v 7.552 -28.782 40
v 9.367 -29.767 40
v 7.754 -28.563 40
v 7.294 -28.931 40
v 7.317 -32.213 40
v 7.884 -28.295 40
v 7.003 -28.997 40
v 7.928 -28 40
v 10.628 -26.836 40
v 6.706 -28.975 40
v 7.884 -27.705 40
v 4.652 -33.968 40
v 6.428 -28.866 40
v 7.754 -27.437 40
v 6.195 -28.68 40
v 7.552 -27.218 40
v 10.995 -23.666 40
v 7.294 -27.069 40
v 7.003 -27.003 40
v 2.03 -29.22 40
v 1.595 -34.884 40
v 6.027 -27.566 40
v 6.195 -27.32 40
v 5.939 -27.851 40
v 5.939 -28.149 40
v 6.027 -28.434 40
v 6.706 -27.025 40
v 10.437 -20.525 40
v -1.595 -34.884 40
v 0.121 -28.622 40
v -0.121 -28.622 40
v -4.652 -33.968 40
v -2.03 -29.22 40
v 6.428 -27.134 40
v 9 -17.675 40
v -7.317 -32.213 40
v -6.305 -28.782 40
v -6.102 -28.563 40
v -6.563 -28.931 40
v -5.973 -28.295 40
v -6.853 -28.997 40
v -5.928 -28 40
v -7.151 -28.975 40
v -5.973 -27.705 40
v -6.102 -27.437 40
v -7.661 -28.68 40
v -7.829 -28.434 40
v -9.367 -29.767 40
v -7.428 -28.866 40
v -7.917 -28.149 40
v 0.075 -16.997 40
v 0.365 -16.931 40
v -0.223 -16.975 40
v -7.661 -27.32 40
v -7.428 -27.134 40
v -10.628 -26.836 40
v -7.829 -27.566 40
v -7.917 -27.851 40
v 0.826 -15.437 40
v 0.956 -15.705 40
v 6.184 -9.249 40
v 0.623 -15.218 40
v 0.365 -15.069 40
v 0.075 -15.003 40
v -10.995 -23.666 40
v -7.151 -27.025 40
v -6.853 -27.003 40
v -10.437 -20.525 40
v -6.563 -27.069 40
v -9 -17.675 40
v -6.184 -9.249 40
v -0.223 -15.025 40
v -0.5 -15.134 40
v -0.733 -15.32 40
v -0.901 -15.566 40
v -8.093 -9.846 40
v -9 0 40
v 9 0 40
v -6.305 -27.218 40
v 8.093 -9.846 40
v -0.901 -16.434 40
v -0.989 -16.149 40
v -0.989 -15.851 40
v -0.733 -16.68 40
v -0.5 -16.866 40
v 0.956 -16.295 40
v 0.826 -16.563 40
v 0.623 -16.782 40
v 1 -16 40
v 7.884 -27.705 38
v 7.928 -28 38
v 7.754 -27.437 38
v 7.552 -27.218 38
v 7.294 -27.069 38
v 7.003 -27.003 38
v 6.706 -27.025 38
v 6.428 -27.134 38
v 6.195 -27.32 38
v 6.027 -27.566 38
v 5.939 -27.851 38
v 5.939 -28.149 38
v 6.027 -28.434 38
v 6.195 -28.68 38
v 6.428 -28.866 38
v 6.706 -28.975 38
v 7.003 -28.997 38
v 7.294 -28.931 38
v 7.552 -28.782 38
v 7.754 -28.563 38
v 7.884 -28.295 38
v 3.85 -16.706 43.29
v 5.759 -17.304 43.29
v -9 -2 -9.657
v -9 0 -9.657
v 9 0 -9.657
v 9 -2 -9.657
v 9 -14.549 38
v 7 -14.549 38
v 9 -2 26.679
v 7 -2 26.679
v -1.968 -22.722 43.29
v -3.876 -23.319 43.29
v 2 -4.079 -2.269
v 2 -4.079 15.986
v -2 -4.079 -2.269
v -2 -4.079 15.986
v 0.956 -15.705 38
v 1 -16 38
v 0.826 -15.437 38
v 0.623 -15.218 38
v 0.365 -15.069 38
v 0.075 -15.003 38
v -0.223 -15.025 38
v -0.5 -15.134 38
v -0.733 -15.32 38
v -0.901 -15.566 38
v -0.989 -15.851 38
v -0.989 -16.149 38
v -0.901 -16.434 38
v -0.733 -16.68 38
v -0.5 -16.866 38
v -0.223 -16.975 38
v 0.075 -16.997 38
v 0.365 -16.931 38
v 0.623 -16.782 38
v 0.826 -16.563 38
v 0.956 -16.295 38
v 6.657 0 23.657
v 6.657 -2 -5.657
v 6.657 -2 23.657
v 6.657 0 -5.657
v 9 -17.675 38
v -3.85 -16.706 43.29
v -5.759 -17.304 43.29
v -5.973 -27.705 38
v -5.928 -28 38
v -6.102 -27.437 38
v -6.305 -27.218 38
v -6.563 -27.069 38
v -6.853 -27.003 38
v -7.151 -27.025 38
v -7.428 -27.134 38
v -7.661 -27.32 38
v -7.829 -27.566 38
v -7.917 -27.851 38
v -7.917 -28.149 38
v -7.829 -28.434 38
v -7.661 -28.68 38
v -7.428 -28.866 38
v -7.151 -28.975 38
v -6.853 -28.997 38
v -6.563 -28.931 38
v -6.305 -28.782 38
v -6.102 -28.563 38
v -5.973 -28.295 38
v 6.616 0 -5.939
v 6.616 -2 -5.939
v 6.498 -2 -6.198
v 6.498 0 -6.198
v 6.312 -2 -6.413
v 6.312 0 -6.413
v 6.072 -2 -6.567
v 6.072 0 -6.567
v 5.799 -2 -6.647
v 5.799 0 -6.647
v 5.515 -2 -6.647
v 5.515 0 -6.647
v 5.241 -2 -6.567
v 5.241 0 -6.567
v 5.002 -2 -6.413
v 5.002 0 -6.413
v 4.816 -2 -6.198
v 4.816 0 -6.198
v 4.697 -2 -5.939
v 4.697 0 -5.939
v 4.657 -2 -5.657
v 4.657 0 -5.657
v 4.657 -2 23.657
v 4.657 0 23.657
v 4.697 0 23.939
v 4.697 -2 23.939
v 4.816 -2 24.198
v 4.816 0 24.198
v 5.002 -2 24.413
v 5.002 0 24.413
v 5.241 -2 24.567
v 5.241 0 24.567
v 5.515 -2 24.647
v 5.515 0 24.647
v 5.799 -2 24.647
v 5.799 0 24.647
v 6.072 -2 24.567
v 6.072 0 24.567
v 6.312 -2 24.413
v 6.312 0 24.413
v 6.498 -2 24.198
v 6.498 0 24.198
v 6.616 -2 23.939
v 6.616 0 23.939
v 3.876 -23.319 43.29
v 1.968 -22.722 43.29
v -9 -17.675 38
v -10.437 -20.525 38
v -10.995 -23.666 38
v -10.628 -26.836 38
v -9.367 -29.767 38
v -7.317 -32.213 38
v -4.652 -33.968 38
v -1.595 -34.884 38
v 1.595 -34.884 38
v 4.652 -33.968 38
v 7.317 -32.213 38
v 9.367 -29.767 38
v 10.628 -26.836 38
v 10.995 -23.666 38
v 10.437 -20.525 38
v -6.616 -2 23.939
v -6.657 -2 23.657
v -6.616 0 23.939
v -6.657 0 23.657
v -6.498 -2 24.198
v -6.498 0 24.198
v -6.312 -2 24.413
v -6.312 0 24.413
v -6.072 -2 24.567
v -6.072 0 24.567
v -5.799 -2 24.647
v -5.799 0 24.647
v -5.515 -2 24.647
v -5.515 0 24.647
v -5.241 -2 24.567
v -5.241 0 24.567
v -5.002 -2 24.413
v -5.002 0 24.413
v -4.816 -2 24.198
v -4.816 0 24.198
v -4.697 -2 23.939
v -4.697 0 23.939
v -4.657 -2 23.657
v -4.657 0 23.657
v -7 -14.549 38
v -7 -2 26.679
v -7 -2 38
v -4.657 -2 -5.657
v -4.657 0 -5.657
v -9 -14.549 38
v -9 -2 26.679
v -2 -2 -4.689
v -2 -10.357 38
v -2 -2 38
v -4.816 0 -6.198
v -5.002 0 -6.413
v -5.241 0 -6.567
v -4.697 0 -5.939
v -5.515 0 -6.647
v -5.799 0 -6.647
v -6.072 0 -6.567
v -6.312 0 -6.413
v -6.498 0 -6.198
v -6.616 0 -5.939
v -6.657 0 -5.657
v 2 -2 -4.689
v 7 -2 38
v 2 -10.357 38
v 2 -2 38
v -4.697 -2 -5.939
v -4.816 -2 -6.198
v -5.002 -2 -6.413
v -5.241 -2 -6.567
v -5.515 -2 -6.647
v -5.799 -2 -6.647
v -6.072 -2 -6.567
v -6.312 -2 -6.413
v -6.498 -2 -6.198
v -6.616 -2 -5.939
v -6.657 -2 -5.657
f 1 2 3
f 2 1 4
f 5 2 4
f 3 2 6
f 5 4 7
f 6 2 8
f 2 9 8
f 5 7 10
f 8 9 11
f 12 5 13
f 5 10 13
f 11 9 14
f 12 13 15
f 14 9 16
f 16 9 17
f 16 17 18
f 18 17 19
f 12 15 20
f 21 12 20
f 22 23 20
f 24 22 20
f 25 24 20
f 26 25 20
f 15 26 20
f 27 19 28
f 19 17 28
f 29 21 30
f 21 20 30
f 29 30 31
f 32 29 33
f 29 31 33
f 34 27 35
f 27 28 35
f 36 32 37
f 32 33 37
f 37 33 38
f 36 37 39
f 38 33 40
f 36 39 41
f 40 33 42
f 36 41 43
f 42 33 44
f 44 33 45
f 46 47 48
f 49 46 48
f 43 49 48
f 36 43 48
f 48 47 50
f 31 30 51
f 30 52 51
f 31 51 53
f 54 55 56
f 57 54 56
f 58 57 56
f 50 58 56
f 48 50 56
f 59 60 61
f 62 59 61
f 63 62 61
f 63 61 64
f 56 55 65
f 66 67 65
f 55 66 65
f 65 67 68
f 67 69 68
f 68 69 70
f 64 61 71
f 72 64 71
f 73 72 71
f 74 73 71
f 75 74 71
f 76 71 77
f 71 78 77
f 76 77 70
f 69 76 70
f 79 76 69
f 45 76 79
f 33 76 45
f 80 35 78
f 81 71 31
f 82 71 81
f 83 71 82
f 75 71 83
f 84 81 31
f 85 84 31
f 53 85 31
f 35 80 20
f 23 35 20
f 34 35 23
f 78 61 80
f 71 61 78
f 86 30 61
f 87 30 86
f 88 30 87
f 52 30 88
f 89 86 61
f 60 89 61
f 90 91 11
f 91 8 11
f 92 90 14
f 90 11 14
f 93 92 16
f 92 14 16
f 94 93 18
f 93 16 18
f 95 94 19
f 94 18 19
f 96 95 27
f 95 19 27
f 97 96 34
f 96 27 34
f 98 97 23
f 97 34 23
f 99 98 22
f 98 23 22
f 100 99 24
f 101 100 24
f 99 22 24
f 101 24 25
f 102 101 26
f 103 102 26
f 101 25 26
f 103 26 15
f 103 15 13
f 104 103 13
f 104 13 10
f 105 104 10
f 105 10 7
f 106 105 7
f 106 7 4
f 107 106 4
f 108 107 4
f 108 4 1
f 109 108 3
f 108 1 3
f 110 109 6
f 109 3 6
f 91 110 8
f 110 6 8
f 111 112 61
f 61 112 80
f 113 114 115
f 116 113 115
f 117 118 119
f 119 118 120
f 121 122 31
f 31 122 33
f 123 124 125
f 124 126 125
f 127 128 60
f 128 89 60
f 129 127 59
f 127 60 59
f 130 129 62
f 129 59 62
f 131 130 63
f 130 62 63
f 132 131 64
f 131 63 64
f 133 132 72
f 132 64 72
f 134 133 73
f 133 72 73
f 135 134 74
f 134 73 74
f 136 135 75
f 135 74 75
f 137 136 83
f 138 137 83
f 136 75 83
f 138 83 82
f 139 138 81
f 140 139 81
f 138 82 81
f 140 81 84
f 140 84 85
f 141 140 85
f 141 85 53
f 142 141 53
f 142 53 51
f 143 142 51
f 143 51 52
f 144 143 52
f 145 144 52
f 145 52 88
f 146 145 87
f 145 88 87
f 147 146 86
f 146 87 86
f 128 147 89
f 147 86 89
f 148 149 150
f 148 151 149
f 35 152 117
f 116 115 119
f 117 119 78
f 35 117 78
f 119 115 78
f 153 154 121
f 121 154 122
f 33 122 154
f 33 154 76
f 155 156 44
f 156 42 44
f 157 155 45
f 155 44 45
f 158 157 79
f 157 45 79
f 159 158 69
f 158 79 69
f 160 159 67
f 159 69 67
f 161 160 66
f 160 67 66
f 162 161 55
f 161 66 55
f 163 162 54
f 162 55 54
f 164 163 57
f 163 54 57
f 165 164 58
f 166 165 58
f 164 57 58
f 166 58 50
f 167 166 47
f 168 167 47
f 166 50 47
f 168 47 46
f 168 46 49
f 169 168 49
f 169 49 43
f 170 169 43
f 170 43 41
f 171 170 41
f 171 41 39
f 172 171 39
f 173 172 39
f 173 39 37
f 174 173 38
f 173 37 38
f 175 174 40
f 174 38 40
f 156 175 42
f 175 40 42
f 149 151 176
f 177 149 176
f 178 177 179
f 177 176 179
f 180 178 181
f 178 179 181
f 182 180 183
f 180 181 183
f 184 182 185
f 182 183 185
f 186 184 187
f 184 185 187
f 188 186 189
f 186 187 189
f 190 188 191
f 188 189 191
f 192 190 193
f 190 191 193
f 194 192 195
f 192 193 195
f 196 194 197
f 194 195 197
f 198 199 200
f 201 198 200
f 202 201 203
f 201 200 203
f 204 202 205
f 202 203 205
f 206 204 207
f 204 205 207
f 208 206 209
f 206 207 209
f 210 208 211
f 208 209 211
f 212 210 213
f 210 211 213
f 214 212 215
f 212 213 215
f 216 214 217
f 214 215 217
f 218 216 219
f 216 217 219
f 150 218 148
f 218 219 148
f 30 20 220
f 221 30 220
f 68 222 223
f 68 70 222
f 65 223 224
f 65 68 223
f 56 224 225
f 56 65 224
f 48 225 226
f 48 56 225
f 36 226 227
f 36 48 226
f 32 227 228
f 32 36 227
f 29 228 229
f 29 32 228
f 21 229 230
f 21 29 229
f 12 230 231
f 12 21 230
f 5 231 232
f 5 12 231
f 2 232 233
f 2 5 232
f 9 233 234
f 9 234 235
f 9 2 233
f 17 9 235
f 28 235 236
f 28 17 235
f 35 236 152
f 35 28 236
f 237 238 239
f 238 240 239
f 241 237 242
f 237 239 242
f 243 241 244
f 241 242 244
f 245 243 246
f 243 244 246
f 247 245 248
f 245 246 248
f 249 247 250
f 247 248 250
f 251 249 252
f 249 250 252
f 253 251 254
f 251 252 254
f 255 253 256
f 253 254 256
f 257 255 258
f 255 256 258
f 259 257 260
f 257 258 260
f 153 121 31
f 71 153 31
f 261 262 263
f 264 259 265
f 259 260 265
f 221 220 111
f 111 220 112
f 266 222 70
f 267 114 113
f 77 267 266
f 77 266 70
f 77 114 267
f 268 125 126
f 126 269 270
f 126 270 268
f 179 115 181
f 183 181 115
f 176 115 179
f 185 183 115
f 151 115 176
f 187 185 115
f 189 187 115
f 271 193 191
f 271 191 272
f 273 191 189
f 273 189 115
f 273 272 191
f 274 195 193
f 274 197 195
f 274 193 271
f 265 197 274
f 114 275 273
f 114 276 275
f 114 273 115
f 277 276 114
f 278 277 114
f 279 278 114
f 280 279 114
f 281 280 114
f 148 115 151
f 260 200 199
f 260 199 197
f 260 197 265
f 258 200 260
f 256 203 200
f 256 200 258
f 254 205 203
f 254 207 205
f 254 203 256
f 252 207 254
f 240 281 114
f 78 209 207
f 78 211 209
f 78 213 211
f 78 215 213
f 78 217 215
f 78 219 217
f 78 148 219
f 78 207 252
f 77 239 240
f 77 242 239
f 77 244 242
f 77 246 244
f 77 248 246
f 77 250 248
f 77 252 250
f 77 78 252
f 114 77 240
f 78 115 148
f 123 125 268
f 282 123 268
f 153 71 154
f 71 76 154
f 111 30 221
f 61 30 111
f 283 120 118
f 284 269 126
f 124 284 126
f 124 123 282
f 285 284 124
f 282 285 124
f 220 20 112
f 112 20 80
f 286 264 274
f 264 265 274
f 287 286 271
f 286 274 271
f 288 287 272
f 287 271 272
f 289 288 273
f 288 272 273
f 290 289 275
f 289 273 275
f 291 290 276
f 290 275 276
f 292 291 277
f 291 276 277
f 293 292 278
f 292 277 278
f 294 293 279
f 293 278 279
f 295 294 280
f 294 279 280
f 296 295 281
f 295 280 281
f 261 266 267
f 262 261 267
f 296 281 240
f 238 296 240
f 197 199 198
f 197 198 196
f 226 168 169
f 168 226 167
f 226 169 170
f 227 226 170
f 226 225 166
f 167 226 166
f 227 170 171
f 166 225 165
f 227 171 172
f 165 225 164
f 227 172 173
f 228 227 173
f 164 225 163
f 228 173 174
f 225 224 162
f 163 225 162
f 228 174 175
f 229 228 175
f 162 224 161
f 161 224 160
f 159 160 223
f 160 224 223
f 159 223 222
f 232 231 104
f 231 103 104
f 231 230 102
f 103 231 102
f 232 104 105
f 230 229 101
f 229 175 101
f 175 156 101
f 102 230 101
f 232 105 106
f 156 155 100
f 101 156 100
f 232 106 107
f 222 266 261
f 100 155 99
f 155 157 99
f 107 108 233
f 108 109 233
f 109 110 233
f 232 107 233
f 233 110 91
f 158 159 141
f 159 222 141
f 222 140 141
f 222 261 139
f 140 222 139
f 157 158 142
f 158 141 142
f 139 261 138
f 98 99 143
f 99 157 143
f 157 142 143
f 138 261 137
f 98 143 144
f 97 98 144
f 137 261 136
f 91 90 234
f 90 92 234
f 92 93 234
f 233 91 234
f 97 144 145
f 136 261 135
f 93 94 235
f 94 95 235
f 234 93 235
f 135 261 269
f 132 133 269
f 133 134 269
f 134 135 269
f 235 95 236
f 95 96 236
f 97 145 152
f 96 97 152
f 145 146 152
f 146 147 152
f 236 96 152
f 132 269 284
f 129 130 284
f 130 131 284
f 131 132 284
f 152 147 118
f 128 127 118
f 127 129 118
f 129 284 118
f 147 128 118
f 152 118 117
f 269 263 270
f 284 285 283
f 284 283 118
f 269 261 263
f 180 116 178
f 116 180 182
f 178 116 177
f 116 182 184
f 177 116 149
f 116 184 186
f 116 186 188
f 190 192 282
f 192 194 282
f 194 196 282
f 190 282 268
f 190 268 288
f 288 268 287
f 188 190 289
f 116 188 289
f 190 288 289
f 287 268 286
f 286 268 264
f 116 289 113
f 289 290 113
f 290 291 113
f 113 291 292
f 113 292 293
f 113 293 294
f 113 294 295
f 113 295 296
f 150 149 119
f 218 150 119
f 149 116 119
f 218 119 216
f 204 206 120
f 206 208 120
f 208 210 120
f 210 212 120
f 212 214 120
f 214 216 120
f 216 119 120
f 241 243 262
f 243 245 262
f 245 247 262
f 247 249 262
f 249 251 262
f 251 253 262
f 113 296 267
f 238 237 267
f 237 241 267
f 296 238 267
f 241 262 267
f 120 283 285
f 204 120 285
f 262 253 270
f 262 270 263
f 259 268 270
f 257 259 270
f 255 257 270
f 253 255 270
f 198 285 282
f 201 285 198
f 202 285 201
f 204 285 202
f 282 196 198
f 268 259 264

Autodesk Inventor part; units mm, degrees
ref_plane "XZ Plane" through (0, 0, 0) normal (0, 1, 0) x (-1, 0, 0)
ref_plane "XY Plane" through (0, 0, 0) normal (0, 0, 1) x (1, 0, 0)
sketch "Sketch1" plane through (0, 0, 0) normal (0, 1, 0) x (-1, 0, 0)
  line L0 (-9, 40) -> (9, 40)
  line L1 (9, 40) -> (9, -9.6569)
  line L2 (9, -9.6569) -> (-9, -9.6569)
  line L3 (-9, -9.6569) -> (-9, 40)
  line L4 (-9, 40) -> (9, -9.6569) construction
  line L5 (9, 40) -> (-9, -9.6569) construction
  line L6 (0, -32.0453) -> (0, 52.0076) construction
  line L7 (-14.8076, 0) -> (25.8453, 0) construction
  line L8 (0, 0) -> (20.0378, -20.0378) construction
  line L9 (5.6569, -6.6569) -> (5.6569, 24.6569) construction
  line L10 (6.6569, -5.6569) -> (6.6569, 23.6569)
  line L11 (4.6569, 23.6569) -> (4.6569, -5.6569)
  arc A0 (4.6569, -5.6569) -> (6.6569, -5.6569) centre (5.6569, -5.6569) ccw
  arc A1 (6.6569, 23.6569) -> (4.6569, 23.6569) centre (5.6569, 23.6569) ccw
  line L12 (0, 0) -> (13.8345, 13.8345) construction
  line L13 (-5.6569, -6.6569) -> (-5.6569, 24.6569) construction
  line L14 (-6.6569, -5.6569) -> (-6.6569, 23.6569)
  line L15 (-4.6569, 23.6569) -> (-4.6569, -5.6569)
  arc A2 (-6.6569, -5.6569) -> (-4.6569, -5.6569) centre (-5.6569, -5.6569) ccw
  arc A3 (-4.6569, 23.6569) -> (-6.6569, 23.6569) centre (-5.6569, 23.6569) ccw
  point P0 (0, 15.1716)
  point P1 (0, 15.1716)
  point P2 (5.6569, -5.6569)
  point P3 (5.6569, 9)
  point P4 (5.6569, 5.6569)
  point P5 (-5.6569, -5.6569)
  point P6 (-5.6569, 9)
  point P7 (-5.6569, 5.6569)
  dimension "d34" = 18
  dimension "d35" = 45
  dimension "d36" = 8
  dimension "d37" = 2
  dimension "d38" = 0
  dimension "d40" = 45
  dimension "d41" = 18
  dimension "d42" = 4
  dimension "d43" = 40
extrude "Extrusion1" add sketch "Sketch1" against normal blind 2
sketch "Sketch4" plane through (-9, 0, 40) normal (0, 0, 1) x (1, 0, 0)
  line L0 (18, 0) -> (18, -2) construction
  line L1 (0, 0) -> (18, 0)
  line L2 (18, 0) -> (18, -17.6754)
  line L3 (9, -39.0627) -> (9, -2) construction
  line L4 (18, -2) -> (0, -2) construction
  line L5 (9, -24) -> (14.2107, -27.0084) construction
  circle A0 centre (15.9282, -28) radius 1
  circle A1 centre (9, -16) radius 1
  circle A2 centre (2.0718, -28) radius 1
  arc A3 (0, -17.6754) -> (18, -17.6754) centre (9, -24) ccw
  line L6 (0, -17.6754) -> (0, 0)
  point P0 (9, 0)
  dimension "d44" = 60
  dimension "d45" = 2
  dimension "d46" = 8
  dimension "d49" = 360
  dimension "d51" = 22
  dimension "d53" = 22
extrude "Extrusion4" add sketch "Sketch4" against normal blind 2
sketch "Sketch5" plane through (-9, -2, -9.6569) normal (-1, 0, 0) x (0, 0, 1)
  line L0 (47.6569, 0) -> (47.6569, -15.6754) projected
  line L1 (47.6569, -12.5494) -> (36.3362, 0)
  line L2 (47.6569, 0) -> (0, 0) projected
  line L3 (47.6569, 0) -> (47.6569, -12.5494)
  line L4 (47.6569, 0) -> (36.3362, 0)
  point P0 (9.6569, 2)
extrude "Extrusion5" add sketch "Sketch5" against normal blind 2
pattern_linear "Rectangular Pattern1" count 2 spacing 16 along (1, 0, 0) of "Extrusion5"
sketch "Sketch6" plane through (0, 0, 0) normal (1, 0, 0) x (0, 1, 0)
  line L0 (-14.5494, 38) -> (-2, 38) construction
  line L1 (-10.3568, 38) -> (-4.0789, 15.9865)
  line L2 (0, 40) -> (0, -9.6569) projected
  line L3 (-2, 38) -> (-10.3568, 38)
  line L4 (-4.0789, 15.9865) -> (-4.0789, -2.2693)
  line L5 (-4.0789, -2.2693) -> (-2, -4.6891)
  line L6 (-2, -4.6891) -> (-2, 38)
  point P0 (0, 0)
extrude "Extrusion6" add sketch "Sketch6" along normal mid plane 4
sketch "Sketch7" plane through (-9, 0, 40) normal (0, 0, 1) x (1, 0, 0)
  circle A0 centre (9, -16) radius 1 construction
  circle A1 centre (9, -16) radius 2 construction
  circle A2 centre (15.9282, -28) radius 1 construction
  circle A3 centre (15.9282, -28) radius 2 construction
  point P0 (9, 0)
  point P1 (14.689, -14.1786)
  point P2 (10.5252, -27.4837)
  dimension "d63" = 4
  dimension "d64" = 4
ref_plane "Work Plane2" through (1.5252, -27.4837, 40) normal (-0.9544, 0.2987, 0) x (0, 0, 1)
sketch "Sketch8" plane through (1.5252, -27.4837, 40) normal (-0.9544, 0.2987, 0) x (0, 0, 1)
  line L0 (0, 11.593) -> (0, -8.1309) projected
  line L1 (0, -1.506) -> (3.29, 4.6767)
  line L2 (3.29, 4.6767) -> (3.29, 10.9801)
  line L3 (3.29, 10.9801) -> (0, 18.7943)
  line L4 (0, 23.0857) -> (0, 6.217) projected
  line L5 (0, -1.506) -> (0, 18.7943)
  point P0 (-40, 25.7737)
extrude "Extrusion7" add sketch "Sketch8" along normal mid plane 2
mirror "Mirror1" about plane through (0, 0, 0) normal (1, 0, 0) of "Extrusion7"
properties part number "gimbal_yaw_brushless" material "ABS Plastic"
